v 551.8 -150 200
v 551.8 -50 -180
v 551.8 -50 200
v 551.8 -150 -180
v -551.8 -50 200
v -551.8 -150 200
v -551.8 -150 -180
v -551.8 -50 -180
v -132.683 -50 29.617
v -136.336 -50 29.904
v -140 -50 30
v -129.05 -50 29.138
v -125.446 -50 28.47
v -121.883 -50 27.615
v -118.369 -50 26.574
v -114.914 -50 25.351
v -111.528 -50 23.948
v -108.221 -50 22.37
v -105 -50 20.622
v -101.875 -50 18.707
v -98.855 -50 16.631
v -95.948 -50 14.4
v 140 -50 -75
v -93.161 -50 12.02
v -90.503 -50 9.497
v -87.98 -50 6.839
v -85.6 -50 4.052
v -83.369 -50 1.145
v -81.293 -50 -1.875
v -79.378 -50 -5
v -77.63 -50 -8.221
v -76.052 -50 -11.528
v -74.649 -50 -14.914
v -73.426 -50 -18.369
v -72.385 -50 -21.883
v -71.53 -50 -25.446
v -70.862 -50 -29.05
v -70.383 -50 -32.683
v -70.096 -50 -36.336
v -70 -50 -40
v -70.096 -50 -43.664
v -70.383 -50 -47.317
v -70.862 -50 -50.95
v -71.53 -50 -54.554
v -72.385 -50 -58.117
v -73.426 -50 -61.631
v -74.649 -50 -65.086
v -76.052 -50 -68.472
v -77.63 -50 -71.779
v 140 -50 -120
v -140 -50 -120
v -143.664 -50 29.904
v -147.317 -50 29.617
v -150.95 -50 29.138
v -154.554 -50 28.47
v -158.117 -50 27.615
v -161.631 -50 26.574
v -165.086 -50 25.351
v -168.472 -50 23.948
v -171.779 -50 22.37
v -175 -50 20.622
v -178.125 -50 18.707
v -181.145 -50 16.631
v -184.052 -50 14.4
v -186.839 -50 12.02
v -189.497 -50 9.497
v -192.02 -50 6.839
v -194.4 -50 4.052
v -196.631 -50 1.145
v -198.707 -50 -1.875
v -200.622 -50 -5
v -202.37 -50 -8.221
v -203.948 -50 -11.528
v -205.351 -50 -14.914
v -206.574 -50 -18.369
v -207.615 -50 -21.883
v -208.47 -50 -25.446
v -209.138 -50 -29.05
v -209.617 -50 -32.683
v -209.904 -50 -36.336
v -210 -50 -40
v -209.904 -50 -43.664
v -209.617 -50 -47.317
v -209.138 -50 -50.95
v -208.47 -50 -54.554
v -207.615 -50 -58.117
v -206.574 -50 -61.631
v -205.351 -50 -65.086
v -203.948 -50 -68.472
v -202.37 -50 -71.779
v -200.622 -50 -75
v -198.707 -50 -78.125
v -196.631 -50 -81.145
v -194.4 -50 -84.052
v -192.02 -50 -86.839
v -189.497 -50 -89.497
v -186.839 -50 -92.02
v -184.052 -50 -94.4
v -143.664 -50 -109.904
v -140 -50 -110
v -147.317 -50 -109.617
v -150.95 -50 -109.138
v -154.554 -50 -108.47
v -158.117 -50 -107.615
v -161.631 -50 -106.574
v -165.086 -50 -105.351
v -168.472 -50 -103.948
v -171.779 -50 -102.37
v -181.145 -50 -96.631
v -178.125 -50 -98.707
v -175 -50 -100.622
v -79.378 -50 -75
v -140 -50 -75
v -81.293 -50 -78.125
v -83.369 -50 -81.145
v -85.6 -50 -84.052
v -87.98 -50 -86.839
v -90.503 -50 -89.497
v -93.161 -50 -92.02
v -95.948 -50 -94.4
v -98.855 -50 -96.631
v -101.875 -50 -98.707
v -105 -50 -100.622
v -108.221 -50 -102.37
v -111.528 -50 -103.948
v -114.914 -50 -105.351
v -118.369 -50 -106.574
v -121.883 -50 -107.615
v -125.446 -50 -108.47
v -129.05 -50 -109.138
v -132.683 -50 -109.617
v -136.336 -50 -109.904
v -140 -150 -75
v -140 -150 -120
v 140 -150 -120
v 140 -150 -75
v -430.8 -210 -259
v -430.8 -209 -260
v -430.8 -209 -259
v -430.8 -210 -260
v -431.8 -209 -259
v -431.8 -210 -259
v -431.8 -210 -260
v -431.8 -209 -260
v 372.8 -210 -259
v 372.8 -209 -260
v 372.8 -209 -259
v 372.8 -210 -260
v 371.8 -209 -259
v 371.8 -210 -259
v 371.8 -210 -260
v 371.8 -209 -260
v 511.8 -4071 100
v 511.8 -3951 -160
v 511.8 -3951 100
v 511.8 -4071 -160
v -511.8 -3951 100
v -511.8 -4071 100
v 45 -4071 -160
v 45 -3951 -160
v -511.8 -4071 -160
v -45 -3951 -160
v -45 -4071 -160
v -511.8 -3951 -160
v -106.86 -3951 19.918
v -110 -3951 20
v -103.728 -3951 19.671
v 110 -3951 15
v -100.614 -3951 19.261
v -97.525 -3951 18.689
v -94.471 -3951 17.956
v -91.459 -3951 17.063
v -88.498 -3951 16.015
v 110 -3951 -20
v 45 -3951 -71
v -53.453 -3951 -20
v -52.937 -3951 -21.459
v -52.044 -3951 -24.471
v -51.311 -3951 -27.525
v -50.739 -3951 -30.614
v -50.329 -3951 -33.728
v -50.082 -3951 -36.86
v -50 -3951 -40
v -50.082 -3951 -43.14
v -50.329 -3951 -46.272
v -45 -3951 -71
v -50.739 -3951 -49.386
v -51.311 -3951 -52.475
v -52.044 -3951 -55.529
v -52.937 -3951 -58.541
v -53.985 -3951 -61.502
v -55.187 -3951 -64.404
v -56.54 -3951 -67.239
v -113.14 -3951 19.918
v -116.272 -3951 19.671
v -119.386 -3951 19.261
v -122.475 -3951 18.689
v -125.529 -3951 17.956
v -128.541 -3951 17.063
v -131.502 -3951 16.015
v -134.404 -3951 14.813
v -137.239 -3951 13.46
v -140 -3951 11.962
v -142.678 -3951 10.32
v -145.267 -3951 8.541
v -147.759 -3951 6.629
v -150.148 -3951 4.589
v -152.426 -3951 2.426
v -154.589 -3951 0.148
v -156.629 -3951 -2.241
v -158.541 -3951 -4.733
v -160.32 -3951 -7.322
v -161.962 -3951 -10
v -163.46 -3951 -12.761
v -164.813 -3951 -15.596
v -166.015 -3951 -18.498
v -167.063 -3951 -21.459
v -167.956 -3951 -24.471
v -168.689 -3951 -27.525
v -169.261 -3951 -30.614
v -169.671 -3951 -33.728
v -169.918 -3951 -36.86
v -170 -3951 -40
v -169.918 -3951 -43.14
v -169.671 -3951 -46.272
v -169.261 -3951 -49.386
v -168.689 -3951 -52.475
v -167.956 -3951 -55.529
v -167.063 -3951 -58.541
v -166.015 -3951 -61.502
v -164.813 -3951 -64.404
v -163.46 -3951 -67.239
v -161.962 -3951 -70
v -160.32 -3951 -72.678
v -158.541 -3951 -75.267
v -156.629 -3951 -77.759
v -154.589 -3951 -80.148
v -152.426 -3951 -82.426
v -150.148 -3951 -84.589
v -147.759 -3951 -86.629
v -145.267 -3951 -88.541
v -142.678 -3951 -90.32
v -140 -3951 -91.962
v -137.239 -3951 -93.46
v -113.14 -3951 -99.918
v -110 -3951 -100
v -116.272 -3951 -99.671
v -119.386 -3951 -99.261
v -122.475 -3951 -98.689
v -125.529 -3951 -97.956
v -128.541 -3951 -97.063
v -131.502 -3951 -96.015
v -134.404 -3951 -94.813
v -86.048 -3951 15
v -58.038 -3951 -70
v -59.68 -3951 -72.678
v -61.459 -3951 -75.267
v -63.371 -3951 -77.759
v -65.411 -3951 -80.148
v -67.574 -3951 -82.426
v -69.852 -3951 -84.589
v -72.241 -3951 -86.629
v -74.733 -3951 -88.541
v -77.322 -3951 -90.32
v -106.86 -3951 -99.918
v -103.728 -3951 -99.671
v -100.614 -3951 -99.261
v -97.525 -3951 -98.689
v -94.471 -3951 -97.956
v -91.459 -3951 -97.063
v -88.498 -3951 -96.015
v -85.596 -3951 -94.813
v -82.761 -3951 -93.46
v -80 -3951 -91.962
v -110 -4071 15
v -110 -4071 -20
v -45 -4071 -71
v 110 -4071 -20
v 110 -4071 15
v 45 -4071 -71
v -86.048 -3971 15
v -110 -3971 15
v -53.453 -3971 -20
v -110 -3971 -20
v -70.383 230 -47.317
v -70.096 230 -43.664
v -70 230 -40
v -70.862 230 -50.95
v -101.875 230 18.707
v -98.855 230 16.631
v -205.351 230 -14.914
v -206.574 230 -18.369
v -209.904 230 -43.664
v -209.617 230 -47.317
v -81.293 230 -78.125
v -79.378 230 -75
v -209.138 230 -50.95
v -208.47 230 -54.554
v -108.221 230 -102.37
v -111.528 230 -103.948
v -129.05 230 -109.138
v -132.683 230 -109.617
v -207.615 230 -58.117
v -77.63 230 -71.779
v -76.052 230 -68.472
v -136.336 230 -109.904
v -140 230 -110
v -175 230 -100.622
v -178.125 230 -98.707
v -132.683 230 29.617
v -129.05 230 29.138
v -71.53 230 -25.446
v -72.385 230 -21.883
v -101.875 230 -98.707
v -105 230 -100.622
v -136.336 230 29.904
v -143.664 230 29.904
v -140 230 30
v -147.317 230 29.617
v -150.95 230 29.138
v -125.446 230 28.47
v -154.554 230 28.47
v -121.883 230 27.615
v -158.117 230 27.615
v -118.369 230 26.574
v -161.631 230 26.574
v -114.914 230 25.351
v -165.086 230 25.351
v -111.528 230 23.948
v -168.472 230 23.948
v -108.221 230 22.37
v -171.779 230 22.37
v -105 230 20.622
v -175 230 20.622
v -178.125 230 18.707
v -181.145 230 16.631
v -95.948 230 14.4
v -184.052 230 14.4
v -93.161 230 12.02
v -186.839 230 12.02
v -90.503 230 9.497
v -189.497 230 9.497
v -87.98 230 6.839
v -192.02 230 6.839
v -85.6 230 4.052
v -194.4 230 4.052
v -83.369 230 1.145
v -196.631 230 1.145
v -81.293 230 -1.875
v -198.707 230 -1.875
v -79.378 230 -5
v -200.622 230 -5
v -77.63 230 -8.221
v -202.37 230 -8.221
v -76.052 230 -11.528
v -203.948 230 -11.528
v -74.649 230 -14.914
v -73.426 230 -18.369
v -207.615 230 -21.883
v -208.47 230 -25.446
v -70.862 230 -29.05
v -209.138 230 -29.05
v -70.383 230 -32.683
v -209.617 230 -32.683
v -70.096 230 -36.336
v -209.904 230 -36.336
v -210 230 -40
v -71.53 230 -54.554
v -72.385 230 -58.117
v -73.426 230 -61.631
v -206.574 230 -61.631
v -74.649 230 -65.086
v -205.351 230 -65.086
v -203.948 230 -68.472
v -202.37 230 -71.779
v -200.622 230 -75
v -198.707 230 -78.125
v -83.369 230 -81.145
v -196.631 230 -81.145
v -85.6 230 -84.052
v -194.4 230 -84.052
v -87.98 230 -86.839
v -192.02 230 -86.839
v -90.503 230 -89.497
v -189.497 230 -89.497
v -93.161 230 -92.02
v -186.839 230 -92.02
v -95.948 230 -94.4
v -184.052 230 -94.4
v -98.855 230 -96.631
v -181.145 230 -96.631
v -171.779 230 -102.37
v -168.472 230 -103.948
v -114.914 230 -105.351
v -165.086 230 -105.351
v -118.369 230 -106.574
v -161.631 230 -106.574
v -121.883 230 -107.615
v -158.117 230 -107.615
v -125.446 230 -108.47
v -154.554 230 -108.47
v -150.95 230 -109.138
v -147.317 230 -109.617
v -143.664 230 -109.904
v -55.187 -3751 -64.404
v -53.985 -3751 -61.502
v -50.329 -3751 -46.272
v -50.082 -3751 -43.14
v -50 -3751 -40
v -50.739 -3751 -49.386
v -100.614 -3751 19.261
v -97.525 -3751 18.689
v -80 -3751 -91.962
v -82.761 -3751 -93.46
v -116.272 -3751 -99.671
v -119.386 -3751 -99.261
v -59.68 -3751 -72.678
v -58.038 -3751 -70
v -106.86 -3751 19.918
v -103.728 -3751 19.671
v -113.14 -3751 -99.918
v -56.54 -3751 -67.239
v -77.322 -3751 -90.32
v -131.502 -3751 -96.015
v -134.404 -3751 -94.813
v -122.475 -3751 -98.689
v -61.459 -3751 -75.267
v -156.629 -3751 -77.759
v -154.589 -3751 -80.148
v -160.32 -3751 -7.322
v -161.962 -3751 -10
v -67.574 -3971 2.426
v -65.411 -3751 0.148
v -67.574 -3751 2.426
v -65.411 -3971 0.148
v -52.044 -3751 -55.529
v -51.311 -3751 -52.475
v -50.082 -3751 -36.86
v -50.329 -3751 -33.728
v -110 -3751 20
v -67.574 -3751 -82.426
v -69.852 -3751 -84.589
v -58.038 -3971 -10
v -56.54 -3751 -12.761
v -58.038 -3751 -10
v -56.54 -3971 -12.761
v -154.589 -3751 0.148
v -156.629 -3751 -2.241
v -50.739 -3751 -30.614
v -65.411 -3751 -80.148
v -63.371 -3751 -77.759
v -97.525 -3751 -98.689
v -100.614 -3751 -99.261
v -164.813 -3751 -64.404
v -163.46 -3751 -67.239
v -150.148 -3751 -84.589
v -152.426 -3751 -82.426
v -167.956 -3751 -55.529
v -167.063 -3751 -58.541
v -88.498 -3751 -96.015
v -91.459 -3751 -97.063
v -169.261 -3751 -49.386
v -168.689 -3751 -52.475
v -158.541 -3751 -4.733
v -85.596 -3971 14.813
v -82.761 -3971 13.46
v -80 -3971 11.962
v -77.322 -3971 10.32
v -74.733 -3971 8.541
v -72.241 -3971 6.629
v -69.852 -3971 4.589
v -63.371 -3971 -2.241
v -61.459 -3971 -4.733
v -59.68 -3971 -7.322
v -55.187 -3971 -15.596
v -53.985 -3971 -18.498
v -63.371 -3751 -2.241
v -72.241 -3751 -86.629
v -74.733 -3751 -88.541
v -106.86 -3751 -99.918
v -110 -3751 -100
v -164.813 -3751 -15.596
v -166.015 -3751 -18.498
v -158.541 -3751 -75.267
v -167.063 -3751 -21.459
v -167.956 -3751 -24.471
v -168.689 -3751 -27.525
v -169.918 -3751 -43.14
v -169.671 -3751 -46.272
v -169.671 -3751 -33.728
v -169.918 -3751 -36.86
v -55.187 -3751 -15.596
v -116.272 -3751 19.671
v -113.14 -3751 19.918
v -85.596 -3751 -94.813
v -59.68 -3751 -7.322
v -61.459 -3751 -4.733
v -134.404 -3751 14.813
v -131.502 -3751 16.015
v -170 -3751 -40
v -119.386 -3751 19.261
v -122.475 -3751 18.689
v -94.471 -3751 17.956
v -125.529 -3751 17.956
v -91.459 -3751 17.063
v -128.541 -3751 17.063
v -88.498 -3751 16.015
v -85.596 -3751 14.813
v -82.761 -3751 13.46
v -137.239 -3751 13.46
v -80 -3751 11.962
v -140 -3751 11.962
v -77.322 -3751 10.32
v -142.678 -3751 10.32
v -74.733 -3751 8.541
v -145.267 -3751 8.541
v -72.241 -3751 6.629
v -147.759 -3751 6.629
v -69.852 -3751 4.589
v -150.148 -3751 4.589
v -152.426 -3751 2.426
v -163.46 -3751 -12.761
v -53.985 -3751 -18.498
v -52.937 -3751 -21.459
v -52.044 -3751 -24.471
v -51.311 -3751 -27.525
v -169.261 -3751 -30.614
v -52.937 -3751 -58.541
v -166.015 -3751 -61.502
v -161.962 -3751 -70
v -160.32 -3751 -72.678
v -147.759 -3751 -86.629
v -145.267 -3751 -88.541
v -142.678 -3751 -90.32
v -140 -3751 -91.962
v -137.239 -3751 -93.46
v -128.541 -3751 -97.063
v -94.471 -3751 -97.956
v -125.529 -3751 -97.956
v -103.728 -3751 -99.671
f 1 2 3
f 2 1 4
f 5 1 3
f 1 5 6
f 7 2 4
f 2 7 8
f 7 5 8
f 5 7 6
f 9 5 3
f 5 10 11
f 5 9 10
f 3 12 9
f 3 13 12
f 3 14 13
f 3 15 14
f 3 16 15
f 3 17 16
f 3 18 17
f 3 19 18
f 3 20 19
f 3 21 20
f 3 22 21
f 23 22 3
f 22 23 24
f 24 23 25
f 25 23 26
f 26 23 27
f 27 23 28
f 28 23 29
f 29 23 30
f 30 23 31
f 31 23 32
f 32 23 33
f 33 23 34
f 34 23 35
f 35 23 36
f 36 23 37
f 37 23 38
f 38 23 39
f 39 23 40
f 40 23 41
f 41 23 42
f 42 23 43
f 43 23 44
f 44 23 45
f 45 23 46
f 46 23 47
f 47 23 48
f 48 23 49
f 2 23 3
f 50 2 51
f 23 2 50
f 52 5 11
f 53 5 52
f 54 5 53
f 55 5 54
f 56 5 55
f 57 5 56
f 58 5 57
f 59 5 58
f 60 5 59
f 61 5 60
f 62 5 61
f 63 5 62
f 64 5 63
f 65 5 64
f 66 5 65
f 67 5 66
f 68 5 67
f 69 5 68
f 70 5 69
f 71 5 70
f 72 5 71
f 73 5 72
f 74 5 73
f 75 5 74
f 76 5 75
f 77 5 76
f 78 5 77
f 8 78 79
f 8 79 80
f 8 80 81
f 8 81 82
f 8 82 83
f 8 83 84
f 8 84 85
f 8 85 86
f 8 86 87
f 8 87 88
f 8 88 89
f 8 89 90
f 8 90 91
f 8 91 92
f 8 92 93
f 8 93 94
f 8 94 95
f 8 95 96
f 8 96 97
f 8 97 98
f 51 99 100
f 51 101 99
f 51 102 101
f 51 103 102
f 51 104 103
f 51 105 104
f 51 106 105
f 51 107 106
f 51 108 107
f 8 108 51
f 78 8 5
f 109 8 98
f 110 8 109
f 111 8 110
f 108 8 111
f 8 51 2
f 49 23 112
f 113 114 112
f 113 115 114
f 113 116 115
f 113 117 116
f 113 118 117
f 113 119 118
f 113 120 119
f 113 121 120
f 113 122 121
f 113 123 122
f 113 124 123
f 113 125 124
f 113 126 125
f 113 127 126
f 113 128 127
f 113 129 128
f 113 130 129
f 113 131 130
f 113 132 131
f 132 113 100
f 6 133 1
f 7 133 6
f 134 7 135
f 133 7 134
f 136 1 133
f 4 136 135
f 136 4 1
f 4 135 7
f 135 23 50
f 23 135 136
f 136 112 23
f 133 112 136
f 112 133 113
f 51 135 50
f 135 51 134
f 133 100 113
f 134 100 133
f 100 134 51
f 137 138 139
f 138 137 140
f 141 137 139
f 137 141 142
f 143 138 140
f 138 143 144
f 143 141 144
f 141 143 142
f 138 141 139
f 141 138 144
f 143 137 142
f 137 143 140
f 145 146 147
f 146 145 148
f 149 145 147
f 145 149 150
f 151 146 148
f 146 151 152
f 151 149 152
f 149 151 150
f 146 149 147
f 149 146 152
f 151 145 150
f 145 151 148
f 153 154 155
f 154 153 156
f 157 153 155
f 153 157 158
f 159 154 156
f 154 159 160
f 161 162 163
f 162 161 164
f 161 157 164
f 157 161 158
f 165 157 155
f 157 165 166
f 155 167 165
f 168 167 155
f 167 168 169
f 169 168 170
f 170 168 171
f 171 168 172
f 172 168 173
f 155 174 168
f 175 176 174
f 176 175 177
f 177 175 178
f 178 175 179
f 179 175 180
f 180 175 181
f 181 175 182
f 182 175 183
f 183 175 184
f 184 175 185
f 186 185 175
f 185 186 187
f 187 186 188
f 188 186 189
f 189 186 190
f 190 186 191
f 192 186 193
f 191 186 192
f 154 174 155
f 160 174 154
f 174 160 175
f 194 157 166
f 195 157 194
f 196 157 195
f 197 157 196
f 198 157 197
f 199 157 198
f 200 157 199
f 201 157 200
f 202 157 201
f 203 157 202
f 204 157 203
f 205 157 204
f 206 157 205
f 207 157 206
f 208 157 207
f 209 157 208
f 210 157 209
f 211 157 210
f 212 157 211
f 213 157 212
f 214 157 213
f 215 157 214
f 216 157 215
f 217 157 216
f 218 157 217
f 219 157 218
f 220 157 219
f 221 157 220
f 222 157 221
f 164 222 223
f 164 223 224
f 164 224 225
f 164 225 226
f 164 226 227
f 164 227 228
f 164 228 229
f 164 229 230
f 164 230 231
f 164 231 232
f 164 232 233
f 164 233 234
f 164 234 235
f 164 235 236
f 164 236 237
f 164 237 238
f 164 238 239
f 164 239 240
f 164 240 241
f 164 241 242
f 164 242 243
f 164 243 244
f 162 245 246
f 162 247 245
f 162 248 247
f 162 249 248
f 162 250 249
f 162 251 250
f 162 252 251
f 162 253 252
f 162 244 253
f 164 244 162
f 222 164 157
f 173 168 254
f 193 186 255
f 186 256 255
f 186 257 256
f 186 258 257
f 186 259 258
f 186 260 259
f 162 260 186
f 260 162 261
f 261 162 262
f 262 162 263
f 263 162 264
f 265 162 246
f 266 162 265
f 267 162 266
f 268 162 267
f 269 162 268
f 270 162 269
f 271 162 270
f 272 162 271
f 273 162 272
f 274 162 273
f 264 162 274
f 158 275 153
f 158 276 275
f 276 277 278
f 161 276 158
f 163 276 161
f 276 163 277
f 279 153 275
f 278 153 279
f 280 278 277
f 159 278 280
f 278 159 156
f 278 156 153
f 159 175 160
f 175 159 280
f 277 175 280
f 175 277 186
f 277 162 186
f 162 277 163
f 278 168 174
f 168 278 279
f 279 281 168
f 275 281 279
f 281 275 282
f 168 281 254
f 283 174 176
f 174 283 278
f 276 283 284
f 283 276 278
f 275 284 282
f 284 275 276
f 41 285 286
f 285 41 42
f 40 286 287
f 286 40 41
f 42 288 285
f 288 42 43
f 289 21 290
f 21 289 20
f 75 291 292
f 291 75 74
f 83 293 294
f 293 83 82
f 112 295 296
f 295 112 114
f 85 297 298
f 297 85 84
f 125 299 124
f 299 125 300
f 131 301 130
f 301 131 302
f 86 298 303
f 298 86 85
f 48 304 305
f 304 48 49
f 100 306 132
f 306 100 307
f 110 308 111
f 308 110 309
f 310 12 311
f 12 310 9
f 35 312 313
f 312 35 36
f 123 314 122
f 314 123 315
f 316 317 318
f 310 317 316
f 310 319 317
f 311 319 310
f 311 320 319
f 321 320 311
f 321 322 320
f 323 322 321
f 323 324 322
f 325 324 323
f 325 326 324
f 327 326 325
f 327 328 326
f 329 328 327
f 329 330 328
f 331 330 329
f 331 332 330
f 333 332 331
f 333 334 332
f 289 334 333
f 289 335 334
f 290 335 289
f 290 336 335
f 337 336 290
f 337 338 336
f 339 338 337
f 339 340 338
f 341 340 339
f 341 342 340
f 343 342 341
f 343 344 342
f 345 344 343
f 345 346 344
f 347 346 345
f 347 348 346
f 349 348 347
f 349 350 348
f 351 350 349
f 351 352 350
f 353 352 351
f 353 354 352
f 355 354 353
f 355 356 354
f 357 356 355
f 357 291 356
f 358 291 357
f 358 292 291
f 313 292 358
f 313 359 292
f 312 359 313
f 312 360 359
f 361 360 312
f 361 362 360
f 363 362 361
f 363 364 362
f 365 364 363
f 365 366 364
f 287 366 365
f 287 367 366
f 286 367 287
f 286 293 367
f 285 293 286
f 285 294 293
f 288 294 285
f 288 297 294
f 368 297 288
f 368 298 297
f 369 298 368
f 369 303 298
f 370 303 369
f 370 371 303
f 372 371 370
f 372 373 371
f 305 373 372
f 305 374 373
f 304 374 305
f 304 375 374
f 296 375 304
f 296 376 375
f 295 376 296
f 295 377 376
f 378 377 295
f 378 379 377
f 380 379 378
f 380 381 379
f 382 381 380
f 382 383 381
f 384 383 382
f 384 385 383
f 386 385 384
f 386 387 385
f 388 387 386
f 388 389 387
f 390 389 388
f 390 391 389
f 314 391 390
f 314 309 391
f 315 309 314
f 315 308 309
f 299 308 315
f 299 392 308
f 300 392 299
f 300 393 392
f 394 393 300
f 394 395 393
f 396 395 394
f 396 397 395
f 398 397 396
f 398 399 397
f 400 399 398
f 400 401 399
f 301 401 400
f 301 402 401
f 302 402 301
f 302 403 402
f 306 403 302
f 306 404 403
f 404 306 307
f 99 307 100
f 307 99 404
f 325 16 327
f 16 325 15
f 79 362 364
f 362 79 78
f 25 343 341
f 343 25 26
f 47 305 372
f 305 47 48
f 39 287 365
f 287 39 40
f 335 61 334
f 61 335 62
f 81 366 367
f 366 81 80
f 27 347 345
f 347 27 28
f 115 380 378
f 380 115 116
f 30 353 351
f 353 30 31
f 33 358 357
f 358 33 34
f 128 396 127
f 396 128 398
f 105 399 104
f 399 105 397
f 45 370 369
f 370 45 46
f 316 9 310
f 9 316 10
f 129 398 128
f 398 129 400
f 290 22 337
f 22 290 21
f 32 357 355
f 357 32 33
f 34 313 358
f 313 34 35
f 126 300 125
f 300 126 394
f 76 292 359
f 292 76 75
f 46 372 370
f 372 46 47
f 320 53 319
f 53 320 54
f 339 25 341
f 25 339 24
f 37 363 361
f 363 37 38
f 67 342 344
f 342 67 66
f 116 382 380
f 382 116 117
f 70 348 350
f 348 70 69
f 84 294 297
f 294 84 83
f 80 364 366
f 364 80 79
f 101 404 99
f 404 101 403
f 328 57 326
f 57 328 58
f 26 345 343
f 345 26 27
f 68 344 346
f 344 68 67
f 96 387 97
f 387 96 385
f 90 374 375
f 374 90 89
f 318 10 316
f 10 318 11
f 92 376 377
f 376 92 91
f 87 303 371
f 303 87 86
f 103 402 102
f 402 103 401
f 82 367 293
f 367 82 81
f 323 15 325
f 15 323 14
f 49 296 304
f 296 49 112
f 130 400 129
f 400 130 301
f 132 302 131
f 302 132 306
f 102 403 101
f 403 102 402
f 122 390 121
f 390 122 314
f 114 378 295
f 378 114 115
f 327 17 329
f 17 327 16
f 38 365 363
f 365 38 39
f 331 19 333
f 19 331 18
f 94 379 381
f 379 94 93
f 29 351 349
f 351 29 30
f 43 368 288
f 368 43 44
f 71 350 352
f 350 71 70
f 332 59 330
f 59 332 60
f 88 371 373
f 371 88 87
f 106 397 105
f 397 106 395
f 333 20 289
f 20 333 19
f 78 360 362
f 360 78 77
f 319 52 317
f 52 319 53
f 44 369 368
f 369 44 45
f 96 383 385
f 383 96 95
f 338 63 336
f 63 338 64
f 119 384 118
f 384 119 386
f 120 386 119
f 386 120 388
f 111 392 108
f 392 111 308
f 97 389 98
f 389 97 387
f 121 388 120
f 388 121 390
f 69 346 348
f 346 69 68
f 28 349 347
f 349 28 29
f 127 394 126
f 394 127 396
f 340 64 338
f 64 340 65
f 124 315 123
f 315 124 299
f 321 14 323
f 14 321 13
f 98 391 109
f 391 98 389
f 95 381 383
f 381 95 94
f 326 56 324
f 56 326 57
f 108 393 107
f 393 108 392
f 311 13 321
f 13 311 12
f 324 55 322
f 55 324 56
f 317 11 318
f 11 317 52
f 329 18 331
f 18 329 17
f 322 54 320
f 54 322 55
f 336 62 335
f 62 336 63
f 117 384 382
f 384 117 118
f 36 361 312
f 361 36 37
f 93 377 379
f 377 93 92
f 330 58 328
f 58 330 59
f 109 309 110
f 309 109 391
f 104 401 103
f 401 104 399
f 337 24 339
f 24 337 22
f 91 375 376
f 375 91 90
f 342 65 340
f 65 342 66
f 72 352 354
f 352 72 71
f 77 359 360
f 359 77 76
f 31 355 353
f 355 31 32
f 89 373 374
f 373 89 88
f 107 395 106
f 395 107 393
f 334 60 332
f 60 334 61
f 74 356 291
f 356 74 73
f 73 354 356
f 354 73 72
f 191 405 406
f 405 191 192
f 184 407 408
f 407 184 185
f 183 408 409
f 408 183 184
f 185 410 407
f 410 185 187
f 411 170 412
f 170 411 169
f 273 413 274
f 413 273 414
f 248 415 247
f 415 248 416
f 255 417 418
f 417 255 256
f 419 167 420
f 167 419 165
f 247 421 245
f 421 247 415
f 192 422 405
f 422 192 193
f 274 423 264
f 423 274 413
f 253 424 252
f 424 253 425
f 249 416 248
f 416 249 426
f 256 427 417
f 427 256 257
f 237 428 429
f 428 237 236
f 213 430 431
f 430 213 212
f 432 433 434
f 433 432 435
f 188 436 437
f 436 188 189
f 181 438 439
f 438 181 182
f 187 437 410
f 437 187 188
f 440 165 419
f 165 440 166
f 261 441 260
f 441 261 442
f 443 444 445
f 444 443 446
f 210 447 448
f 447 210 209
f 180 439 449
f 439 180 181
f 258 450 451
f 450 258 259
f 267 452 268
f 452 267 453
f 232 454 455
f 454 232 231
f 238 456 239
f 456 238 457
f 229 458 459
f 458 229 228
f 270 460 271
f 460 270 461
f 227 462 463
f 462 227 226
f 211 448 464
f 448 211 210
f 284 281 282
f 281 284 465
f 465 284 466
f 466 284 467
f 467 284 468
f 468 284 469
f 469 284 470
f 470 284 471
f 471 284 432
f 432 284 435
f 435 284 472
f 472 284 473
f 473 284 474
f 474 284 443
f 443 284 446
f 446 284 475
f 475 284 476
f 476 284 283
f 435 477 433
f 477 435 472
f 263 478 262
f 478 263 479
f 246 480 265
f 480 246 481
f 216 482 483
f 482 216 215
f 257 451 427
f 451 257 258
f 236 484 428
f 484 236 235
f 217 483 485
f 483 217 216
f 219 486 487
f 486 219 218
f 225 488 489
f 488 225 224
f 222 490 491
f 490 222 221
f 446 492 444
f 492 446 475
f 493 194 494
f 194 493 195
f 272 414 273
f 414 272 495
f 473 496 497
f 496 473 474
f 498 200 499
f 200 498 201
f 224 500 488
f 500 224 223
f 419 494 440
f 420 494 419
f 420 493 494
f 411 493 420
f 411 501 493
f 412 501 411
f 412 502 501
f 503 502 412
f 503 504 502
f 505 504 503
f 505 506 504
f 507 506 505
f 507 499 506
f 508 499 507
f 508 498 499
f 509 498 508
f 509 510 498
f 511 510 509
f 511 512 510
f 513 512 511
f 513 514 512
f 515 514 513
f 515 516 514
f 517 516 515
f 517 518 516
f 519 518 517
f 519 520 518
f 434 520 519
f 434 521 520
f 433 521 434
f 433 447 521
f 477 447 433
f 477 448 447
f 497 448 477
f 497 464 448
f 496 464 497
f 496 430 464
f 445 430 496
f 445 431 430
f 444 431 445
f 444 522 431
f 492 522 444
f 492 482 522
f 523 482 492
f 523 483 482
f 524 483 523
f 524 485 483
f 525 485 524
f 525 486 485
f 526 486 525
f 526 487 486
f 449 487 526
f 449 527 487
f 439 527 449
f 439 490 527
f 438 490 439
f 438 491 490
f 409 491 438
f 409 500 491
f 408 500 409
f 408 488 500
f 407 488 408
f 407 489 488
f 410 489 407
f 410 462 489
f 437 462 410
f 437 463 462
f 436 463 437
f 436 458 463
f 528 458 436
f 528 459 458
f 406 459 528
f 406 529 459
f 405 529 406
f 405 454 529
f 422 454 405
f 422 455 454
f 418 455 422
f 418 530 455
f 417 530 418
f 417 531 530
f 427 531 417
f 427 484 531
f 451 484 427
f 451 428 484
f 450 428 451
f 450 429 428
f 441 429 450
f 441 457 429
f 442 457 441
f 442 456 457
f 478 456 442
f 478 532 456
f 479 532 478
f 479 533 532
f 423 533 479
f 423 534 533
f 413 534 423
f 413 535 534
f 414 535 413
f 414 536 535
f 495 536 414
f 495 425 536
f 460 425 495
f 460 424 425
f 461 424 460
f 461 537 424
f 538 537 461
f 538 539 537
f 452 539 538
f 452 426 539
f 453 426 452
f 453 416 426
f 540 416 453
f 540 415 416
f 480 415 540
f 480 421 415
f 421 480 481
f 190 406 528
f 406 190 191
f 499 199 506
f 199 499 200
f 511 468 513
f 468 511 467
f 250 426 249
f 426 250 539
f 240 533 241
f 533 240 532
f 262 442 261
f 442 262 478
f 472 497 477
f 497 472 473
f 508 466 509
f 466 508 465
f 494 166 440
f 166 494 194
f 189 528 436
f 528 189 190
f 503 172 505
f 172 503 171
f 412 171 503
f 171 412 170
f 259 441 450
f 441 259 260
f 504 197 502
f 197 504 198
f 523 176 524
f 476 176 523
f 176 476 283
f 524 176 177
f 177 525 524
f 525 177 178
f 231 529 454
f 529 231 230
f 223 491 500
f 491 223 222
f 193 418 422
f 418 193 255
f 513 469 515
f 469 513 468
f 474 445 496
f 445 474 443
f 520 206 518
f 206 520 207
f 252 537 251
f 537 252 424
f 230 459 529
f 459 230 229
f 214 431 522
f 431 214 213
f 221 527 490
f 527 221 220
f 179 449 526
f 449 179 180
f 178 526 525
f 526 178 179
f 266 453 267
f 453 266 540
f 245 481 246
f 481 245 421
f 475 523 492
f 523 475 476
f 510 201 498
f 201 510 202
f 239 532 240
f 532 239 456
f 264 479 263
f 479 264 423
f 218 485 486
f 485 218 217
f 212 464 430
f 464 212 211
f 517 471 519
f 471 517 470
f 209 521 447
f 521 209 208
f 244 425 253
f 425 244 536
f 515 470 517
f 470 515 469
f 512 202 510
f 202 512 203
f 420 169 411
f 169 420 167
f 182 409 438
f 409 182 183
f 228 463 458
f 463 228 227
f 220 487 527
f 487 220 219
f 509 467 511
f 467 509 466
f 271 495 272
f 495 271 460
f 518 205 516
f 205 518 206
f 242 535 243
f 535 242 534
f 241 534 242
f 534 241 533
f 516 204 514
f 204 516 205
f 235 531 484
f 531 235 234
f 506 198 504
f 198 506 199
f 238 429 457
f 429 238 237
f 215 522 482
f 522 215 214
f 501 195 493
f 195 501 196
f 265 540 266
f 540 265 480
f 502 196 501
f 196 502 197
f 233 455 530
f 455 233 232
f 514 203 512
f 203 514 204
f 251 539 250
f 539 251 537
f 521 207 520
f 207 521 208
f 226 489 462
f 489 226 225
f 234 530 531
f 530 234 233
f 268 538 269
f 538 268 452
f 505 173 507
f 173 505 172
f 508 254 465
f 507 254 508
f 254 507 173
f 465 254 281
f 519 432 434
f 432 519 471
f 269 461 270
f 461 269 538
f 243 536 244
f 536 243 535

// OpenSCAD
// ====================================================================================
// REVOLUTIONARY TECHNOLOGY COMPANY & UNIVERSITY OF WASHINGTON DEPARTMENT OF PHYSICS
// Module: silverado_md_armor.scad (Commercial Fleet Push Bumpers & Dual Winches)
// Core Application: 2027-2028 Silverado MD Frame-Anchored Recovery & Interception Armor
// Center Origin (0,0,0) = Mid-point of Front Frame Crossmember Structural Face
// ====================================================================================

$fn = 120; // High-precision CNC plasma-profile and heavy weldment resolution

// --- 2027-2028 Silverado MD Armor Constants (mm) ---
inch_to_mm          = 25.4;
frame_rail_spacing  = 34.0  * inch_to_mm; // 863.60 mm standard straight truck width [INDEX]
truck_wheelbase     = 165.0 * inch_to_mm; // 4191.00 mm continuous chassis length [INDEX]
bumper_plate_thick  = 8.00;               // Heavy 8mm industrial plate armor steel
winch_drum_large    = 280.00;             // Heavy 20,000-lb front extraction winch spool
winch_drum_small    = 220.00;             // Heavy 15,000-lb rear recovery winch spool

module front_interceptor_push_bumper() {
    echo("COMPILING REINFORCED CHASSIS-MOUNTED FRONT DEFENSE BUMPER AND WINCH CELL");
    // Front impact assembly (Welds straight into the front frame horn plates)
    color("Black") {
        translate([-frame_rail_spacing/2 - 120, -150, -180]) {
            difference() {
                // Main heavy horizontal push fascia block
                cube([frame_rail_spacing + 240, 100, 380]);
                // Clear hawse fairlead roller window cutout passage for the front winching line
                translate([frame_rail_spacing/2 + 120 - winch_drum_large/2, -1, 60])
                    cube([winch_drum_large, 102, 45]);
            }
            // Left heavy push vertical push-knee tooth
            translate([120, -60, -80]) cube();
            // Right heavy push vertical push-knee tooth
            translate([frame_rail_spacing + 60, -60, -80]) cube();
        }
    }
}

module rear_tactical_step_bumper() {
    echo("COMPILING REAR HEAVY-TONNAGE IMPACT RAM STEP BUMPER");
    // Rear impact step assembly (Bolts to frame tails, providing 100mm upfit clearance notch)
    color("DarkSlateGrey") {
        translate([-frame_rail_spacing/2 - 80, -truck_wheelbase + 120, -160]) {
            difference() {
                // Main rear wide bumper block profile
                cube([frame_rail_spacing + 160, 120, 260]);
                // Center clear cutout cavity for the heavy-duty Class V trailer receiver hitch post
                translate([frame_rail_spacing/2 + 80 - 45, -1, -1])
                    cube([90, 122, 90]);
                // Window passage for the rear recovery winch guide cable
                translate([frame_rail_spacing/2 + 80 - winch_drum_small/2, -1, 140])
                    cube([winch_drum_small, 122, 35]);
            }
        }
    }
}

module dual_chassis_extraction_winches() {
    // 1. FRONT WINCH CELL (20,000-lb planetary recovery winch inside front crossmember)
    color("DimGrey") {
        translate([-winch_drum_large/2, -50, -40]) {
            rotate([-90, 0, 0])
                cylinder(d=140, h=winch_drum_large);
            // High-amperage terminal block casing
            translate([winch_drum_large/3, -40, 80])
                cube();
        }
    }
    
    // 2. REAR RECOVERY WINCH (15,000-lb assistance winch nested behind rear differential)
    color("SlateGrey") {
        translate([-winch_drum_small/2, -truck_wheelbase + 220, -40]) {
            rotate([-90, 0, 0])
                cylinder(d=120, h=winch_drum_small);
        }
    }
}

// --- Composite Commercial Armor Matrix Instantiation ---
union() {
    front_interceptor_push_bumper();
    rear_tactical_step_bumper();
    dual_chassis_extraction_winches();
}
